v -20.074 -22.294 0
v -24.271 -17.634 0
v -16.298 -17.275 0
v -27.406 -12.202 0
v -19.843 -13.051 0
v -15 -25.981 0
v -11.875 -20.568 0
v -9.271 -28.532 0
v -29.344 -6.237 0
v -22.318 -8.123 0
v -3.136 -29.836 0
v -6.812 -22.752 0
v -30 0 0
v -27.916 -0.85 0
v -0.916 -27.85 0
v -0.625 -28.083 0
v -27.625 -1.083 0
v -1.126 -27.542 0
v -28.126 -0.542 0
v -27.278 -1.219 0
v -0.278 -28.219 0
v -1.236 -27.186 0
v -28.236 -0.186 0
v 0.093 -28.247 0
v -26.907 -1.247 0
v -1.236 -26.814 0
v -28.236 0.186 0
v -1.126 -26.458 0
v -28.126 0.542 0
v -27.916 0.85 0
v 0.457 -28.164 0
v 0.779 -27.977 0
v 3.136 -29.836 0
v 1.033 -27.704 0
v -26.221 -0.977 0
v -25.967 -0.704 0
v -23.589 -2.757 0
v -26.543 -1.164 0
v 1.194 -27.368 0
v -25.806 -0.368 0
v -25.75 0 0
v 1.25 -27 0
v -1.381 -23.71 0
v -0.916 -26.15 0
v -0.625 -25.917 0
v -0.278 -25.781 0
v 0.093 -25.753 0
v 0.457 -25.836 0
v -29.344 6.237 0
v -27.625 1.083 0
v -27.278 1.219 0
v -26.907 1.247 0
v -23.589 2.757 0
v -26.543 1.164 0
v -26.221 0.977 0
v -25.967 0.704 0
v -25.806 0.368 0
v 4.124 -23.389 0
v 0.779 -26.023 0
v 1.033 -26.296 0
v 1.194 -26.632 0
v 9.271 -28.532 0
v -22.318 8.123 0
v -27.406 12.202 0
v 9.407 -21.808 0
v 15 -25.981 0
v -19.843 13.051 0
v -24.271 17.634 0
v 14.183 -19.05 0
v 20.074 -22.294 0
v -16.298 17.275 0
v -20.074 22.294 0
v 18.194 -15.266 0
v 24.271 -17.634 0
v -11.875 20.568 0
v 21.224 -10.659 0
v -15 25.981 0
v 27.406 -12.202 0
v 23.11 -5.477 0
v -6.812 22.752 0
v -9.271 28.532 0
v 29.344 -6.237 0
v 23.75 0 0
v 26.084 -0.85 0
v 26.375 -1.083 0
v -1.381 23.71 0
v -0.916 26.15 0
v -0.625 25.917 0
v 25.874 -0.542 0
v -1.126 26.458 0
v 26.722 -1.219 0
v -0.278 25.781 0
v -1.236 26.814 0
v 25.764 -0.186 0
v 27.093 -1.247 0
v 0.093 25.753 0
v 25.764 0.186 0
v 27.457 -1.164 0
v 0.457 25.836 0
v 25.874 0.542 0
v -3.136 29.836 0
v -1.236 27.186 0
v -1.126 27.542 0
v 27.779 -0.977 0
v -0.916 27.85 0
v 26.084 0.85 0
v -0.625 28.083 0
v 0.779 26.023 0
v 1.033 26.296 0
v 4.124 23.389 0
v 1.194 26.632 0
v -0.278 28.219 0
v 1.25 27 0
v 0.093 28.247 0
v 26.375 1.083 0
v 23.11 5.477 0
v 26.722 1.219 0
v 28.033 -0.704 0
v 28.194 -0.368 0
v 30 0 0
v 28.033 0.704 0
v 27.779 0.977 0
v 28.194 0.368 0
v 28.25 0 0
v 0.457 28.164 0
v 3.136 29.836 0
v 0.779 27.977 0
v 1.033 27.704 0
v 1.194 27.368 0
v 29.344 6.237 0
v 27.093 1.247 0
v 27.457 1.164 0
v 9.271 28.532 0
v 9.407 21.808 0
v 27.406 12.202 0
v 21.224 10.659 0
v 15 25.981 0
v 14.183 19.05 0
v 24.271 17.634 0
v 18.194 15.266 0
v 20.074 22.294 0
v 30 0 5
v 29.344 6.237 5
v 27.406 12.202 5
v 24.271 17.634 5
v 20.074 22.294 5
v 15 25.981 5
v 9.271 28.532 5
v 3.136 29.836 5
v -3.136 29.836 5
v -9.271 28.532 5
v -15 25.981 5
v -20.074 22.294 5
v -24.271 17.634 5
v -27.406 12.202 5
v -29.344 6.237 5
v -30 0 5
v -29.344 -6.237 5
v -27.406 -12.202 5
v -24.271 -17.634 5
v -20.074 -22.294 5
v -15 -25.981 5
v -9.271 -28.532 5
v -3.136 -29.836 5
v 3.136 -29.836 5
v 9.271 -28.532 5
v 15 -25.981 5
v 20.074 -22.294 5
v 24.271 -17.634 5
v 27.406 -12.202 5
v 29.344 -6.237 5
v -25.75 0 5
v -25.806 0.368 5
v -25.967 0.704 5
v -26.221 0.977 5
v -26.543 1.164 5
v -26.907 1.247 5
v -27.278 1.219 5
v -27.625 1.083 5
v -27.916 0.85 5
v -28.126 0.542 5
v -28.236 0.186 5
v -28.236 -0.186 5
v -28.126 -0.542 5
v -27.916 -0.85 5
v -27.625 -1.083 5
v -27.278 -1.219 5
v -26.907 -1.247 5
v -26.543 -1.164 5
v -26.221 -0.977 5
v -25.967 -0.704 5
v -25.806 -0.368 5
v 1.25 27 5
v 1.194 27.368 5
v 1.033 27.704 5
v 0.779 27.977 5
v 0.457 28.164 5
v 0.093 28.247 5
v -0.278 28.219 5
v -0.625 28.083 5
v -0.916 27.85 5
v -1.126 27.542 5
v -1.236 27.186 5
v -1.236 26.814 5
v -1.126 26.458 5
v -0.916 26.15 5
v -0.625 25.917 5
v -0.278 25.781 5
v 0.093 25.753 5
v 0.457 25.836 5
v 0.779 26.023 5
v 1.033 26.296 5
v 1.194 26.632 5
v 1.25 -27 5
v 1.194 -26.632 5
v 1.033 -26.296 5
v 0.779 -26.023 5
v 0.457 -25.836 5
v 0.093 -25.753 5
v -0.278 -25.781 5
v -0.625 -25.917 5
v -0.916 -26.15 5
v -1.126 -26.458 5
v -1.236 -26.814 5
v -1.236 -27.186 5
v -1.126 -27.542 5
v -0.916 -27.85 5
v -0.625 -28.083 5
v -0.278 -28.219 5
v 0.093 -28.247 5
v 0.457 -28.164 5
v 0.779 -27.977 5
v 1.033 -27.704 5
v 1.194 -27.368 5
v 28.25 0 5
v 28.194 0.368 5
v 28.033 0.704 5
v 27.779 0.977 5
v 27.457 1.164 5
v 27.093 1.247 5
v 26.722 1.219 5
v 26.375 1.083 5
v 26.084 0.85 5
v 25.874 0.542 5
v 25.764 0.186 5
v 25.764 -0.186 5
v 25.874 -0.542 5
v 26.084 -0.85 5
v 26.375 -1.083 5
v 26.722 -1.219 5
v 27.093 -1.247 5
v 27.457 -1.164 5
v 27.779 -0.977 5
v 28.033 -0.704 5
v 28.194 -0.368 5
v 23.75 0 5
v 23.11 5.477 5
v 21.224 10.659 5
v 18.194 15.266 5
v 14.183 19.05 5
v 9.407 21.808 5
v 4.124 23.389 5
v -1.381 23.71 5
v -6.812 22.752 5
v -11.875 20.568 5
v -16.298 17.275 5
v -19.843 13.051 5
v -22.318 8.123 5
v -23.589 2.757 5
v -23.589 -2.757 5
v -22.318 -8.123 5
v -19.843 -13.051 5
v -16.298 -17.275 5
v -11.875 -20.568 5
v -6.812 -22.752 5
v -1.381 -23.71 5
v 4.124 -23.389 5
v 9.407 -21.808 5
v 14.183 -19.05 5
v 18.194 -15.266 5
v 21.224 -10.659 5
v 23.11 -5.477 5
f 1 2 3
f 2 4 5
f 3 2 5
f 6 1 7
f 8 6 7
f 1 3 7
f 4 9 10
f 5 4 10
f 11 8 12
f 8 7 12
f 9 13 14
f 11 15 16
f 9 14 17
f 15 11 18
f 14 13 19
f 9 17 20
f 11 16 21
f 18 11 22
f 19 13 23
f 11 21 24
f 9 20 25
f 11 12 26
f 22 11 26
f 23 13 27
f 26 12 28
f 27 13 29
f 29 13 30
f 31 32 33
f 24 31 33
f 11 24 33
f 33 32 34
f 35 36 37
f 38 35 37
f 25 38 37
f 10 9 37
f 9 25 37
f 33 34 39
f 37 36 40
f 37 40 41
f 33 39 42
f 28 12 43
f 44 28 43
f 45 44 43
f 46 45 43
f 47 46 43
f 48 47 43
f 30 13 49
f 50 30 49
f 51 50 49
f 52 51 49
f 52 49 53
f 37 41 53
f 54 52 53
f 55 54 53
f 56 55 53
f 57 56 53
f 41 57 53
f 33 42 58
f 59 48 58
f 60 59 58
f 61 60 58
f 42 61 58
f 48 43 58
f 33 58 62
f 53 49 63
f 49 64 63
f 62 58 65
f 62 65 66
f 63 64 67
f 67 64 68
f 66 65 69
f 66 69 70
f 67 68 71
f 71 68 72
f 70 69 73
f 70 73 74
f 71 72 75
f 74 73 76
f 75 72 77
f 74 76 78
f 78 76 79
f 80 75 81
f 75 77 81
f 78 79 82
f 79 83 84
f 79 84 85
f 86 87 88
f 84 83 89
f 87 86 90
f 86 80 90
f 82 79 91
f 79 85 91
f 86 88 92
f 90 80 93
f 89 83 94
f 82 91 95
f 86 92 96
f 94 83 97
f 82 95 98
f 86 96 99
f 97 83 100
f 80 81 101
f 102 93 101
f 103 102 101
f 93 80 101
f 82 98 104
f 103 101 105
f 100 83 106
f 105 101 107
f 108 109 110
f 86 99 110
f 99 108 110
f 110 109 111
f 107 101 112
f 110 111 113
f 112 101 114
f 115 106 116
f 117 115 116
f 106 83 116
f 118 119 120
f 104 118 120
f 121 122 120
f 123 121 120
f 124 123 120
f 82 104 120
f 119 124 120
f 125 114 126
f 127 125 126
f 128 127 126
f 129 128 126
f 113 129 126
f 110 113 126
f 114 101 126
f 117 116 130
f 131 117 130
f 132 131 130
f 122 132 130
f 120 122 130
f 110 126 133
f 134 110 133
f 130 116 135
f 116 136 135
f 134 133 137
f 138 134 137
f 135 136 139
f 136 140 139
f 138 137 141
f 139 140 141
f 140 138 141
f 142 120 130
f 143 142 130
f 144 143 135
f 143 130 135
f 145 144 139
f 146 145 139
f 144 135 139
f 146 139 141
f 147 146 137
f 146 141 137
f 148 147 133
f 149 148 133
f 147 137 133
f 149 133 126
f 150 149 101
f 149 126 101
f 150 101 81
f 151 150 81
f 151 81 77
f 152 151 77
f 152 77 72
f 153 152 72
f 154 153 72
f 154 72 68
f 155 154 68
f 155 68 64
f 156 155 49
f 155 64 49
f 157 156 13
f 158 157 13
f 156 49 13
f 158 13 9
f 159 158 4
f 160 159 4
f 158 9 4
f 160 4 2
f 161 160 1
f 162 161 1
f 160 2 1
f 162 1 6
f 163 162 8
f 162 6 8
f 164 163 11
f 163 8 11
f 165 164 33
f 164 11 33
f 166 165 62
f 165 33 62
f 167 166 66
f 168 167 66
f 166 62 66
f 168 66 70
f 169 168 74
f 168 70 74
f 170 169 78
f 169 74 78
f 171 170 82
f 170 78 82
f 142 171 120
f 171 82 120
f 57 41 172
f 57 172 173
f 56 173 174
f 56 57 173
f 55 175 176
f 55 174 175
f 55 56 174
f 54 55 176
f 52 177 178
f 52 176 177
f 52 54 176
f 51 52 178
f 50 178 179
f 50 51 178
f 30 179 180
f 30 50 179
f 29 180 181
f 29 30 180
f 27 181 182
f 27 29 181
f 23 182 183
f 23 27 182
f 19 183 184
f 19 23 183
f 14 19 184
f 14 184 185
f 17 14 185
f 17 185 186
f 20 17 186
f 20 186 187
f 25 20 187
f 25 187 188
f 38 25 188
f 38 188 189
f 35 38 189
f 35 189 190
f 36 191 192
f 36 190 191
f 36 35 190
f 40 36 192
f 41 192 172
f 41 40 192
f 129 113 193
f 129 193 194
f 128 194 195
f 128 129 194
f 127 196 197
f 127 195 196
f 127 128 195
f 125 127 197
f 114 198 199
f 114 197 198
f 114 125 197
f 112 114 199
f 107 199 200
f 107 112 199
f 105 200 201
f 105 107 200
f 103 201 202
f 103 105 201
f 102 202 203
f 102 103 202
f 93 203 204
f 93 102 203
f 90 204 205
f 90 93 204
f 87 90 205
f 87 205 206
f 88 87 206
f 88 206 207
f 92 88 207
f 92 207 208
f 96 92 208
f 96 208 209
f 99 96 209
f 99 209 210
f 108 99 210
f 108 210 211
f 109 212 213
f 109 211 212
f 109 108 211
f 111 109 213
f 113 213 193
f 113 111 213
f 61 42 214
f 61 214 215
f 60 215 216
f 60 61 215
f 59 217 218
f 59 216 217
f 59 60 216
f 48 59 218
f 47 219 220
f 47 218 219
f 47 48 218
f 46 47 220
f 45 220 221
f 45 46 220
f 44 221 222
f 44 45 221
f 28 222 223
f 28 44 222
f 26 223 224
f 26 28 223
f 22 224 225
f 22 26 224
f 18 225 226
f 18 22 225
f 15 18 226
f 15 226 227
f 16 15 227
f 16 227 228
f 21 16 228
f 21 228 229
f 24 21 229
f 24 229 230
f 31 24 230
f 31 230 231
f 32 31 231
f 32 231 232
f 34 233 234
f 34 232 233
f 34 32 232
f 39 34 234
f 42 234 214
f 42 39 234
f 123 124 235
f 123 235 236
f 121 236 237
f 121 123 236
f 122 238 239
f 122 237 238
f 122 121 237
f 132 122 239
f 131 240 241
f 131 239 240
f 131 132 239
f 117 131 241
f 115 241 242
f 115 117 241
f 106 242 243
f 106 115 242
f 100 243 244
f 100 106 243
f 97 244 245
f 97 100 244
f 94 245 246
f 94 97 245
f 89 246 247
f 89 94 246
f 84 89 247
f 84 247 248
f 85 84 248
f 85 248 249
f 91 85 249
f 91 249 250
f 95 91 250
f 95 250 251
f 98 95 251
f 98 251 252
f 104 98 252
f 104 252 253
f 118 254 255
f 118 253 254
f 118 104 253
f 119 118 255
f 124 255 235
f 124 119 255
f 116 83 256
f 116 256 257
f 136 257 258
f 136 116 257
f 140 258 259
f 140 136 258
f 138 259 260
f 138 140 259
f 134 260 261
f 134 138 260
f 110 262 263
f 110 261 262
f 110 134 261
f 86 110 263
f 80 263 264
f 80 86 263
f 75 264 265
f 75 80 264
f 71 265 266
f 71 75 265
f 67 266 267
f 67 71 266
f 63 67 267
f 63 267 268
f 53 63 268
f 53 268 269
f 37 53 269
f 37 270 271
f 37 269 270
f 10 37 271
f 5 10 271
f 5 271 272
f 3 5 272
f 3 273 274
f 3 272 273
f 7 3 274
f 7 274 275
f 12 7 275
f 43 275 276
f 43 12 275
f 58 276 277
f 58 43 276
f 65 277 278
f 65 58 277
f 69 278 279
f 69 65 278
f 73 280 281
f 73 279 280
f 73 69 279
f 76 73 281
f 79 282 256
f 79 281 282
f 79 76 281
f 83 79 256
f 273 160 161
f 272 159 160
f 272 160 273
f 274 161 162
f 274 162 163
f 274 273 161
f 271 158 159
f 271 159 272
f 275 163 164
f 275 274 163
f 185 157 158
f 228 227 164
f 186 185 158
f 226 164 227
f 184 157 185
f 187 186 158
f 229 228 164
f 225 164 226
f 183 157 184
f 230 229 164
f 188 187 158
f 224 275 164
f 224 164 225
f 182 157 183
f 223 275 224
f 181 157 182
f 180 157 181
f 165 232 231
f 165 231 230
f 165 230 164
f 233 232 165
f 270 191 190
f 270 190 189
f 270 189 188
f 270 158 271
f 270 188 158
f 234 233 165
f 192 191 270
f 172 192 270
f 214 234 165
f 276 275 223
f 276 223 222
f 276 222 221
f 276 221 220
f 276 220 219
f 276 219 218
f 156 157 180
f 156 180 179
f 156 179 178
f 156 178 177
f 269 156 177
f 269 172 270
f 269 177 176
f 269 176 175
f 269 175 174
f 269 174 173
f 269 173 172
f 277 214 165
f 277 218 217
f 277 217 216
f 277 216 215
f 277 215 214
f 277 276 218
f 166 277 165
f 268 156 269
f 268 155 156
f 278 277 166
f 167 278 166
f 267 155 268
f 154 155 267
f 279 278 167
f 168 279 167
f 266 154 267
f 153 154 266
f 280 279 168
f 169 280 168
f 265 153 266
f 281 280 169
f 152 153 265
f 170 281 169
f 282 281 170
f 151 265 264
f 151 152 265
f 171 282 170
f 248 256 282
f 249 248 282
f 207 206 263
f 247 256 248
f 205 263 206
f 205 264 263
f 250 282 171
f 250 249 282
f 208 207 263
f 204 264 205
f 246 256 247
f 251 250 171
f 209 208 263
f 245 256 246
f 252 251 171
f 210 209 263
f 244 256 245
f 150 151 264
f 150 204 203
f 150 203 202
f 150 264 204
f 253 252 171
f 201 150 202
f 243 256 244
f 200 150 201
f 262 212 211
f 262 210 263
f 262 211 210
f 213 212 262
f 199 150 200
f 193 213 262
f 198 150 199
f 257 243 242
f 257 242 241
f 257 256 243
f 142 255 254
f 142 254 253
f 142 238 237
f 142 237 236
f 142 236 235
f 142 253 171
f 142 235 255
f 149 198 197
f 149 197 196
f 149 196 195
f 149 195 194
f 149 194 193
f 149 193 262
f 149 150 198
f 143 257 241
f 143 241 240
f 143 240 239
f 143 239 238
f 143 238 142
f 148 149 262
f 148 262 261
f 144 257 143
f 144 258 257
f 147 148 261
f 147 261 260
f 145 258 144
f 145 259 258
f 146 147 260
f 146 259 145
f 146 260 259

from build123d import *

# Parameters (mm, degrees)
ESKIZ_KONTUR_R        = 30
PLASTINA_DEPTH        = 5
OTVERSTIYA_DEPTH      = 43.720018727
OTVERSTIYA_DEPTH_BACK = 43.720018727
ESKIZ_OTVERSTIYA_R    = 1.25
ESKIZ_OTVERSTIYA_R_2  = 23.75


with BuildPart() as part:
    # Eskiz_kontur → Plastina (new body)
    with BuildSketch(Plane.XY):
        Circle(ESKIZ_KONTUR_R)
    extrude(amount=PLASTINA_DEPTH)

    # Eskiz_otverstiya → Otverstiya (cut, two sides: drawn at the far end of the back side and taken through both)
    with BuildSketch(Plane.XY.offset(-OTVERSTIYA_DEPTH_BACK)):
        with Locations((0, -27)):
            Circle(ESKIZ_OTVERSTIYA_R)
        with Locations((-27, 0)):
            Circle(ESKIZ_OTVERSTIYA_R)
        Circle(ESKIZ_OTVERSTIYA_R_2)
        with Locations((27, 0)):
            Circle(ESKIZ_OTVERSTIYA_R)
        with Locations((0, 27)):
            Circle(ESKIZ_OTVERSTIYA_R)
    extrude(amount=OTVERSTIYA_DEPTH + OTVERSTIYA_DEPTH_BACK, mode=Mode.SUBTRACT)


solid = part.part
